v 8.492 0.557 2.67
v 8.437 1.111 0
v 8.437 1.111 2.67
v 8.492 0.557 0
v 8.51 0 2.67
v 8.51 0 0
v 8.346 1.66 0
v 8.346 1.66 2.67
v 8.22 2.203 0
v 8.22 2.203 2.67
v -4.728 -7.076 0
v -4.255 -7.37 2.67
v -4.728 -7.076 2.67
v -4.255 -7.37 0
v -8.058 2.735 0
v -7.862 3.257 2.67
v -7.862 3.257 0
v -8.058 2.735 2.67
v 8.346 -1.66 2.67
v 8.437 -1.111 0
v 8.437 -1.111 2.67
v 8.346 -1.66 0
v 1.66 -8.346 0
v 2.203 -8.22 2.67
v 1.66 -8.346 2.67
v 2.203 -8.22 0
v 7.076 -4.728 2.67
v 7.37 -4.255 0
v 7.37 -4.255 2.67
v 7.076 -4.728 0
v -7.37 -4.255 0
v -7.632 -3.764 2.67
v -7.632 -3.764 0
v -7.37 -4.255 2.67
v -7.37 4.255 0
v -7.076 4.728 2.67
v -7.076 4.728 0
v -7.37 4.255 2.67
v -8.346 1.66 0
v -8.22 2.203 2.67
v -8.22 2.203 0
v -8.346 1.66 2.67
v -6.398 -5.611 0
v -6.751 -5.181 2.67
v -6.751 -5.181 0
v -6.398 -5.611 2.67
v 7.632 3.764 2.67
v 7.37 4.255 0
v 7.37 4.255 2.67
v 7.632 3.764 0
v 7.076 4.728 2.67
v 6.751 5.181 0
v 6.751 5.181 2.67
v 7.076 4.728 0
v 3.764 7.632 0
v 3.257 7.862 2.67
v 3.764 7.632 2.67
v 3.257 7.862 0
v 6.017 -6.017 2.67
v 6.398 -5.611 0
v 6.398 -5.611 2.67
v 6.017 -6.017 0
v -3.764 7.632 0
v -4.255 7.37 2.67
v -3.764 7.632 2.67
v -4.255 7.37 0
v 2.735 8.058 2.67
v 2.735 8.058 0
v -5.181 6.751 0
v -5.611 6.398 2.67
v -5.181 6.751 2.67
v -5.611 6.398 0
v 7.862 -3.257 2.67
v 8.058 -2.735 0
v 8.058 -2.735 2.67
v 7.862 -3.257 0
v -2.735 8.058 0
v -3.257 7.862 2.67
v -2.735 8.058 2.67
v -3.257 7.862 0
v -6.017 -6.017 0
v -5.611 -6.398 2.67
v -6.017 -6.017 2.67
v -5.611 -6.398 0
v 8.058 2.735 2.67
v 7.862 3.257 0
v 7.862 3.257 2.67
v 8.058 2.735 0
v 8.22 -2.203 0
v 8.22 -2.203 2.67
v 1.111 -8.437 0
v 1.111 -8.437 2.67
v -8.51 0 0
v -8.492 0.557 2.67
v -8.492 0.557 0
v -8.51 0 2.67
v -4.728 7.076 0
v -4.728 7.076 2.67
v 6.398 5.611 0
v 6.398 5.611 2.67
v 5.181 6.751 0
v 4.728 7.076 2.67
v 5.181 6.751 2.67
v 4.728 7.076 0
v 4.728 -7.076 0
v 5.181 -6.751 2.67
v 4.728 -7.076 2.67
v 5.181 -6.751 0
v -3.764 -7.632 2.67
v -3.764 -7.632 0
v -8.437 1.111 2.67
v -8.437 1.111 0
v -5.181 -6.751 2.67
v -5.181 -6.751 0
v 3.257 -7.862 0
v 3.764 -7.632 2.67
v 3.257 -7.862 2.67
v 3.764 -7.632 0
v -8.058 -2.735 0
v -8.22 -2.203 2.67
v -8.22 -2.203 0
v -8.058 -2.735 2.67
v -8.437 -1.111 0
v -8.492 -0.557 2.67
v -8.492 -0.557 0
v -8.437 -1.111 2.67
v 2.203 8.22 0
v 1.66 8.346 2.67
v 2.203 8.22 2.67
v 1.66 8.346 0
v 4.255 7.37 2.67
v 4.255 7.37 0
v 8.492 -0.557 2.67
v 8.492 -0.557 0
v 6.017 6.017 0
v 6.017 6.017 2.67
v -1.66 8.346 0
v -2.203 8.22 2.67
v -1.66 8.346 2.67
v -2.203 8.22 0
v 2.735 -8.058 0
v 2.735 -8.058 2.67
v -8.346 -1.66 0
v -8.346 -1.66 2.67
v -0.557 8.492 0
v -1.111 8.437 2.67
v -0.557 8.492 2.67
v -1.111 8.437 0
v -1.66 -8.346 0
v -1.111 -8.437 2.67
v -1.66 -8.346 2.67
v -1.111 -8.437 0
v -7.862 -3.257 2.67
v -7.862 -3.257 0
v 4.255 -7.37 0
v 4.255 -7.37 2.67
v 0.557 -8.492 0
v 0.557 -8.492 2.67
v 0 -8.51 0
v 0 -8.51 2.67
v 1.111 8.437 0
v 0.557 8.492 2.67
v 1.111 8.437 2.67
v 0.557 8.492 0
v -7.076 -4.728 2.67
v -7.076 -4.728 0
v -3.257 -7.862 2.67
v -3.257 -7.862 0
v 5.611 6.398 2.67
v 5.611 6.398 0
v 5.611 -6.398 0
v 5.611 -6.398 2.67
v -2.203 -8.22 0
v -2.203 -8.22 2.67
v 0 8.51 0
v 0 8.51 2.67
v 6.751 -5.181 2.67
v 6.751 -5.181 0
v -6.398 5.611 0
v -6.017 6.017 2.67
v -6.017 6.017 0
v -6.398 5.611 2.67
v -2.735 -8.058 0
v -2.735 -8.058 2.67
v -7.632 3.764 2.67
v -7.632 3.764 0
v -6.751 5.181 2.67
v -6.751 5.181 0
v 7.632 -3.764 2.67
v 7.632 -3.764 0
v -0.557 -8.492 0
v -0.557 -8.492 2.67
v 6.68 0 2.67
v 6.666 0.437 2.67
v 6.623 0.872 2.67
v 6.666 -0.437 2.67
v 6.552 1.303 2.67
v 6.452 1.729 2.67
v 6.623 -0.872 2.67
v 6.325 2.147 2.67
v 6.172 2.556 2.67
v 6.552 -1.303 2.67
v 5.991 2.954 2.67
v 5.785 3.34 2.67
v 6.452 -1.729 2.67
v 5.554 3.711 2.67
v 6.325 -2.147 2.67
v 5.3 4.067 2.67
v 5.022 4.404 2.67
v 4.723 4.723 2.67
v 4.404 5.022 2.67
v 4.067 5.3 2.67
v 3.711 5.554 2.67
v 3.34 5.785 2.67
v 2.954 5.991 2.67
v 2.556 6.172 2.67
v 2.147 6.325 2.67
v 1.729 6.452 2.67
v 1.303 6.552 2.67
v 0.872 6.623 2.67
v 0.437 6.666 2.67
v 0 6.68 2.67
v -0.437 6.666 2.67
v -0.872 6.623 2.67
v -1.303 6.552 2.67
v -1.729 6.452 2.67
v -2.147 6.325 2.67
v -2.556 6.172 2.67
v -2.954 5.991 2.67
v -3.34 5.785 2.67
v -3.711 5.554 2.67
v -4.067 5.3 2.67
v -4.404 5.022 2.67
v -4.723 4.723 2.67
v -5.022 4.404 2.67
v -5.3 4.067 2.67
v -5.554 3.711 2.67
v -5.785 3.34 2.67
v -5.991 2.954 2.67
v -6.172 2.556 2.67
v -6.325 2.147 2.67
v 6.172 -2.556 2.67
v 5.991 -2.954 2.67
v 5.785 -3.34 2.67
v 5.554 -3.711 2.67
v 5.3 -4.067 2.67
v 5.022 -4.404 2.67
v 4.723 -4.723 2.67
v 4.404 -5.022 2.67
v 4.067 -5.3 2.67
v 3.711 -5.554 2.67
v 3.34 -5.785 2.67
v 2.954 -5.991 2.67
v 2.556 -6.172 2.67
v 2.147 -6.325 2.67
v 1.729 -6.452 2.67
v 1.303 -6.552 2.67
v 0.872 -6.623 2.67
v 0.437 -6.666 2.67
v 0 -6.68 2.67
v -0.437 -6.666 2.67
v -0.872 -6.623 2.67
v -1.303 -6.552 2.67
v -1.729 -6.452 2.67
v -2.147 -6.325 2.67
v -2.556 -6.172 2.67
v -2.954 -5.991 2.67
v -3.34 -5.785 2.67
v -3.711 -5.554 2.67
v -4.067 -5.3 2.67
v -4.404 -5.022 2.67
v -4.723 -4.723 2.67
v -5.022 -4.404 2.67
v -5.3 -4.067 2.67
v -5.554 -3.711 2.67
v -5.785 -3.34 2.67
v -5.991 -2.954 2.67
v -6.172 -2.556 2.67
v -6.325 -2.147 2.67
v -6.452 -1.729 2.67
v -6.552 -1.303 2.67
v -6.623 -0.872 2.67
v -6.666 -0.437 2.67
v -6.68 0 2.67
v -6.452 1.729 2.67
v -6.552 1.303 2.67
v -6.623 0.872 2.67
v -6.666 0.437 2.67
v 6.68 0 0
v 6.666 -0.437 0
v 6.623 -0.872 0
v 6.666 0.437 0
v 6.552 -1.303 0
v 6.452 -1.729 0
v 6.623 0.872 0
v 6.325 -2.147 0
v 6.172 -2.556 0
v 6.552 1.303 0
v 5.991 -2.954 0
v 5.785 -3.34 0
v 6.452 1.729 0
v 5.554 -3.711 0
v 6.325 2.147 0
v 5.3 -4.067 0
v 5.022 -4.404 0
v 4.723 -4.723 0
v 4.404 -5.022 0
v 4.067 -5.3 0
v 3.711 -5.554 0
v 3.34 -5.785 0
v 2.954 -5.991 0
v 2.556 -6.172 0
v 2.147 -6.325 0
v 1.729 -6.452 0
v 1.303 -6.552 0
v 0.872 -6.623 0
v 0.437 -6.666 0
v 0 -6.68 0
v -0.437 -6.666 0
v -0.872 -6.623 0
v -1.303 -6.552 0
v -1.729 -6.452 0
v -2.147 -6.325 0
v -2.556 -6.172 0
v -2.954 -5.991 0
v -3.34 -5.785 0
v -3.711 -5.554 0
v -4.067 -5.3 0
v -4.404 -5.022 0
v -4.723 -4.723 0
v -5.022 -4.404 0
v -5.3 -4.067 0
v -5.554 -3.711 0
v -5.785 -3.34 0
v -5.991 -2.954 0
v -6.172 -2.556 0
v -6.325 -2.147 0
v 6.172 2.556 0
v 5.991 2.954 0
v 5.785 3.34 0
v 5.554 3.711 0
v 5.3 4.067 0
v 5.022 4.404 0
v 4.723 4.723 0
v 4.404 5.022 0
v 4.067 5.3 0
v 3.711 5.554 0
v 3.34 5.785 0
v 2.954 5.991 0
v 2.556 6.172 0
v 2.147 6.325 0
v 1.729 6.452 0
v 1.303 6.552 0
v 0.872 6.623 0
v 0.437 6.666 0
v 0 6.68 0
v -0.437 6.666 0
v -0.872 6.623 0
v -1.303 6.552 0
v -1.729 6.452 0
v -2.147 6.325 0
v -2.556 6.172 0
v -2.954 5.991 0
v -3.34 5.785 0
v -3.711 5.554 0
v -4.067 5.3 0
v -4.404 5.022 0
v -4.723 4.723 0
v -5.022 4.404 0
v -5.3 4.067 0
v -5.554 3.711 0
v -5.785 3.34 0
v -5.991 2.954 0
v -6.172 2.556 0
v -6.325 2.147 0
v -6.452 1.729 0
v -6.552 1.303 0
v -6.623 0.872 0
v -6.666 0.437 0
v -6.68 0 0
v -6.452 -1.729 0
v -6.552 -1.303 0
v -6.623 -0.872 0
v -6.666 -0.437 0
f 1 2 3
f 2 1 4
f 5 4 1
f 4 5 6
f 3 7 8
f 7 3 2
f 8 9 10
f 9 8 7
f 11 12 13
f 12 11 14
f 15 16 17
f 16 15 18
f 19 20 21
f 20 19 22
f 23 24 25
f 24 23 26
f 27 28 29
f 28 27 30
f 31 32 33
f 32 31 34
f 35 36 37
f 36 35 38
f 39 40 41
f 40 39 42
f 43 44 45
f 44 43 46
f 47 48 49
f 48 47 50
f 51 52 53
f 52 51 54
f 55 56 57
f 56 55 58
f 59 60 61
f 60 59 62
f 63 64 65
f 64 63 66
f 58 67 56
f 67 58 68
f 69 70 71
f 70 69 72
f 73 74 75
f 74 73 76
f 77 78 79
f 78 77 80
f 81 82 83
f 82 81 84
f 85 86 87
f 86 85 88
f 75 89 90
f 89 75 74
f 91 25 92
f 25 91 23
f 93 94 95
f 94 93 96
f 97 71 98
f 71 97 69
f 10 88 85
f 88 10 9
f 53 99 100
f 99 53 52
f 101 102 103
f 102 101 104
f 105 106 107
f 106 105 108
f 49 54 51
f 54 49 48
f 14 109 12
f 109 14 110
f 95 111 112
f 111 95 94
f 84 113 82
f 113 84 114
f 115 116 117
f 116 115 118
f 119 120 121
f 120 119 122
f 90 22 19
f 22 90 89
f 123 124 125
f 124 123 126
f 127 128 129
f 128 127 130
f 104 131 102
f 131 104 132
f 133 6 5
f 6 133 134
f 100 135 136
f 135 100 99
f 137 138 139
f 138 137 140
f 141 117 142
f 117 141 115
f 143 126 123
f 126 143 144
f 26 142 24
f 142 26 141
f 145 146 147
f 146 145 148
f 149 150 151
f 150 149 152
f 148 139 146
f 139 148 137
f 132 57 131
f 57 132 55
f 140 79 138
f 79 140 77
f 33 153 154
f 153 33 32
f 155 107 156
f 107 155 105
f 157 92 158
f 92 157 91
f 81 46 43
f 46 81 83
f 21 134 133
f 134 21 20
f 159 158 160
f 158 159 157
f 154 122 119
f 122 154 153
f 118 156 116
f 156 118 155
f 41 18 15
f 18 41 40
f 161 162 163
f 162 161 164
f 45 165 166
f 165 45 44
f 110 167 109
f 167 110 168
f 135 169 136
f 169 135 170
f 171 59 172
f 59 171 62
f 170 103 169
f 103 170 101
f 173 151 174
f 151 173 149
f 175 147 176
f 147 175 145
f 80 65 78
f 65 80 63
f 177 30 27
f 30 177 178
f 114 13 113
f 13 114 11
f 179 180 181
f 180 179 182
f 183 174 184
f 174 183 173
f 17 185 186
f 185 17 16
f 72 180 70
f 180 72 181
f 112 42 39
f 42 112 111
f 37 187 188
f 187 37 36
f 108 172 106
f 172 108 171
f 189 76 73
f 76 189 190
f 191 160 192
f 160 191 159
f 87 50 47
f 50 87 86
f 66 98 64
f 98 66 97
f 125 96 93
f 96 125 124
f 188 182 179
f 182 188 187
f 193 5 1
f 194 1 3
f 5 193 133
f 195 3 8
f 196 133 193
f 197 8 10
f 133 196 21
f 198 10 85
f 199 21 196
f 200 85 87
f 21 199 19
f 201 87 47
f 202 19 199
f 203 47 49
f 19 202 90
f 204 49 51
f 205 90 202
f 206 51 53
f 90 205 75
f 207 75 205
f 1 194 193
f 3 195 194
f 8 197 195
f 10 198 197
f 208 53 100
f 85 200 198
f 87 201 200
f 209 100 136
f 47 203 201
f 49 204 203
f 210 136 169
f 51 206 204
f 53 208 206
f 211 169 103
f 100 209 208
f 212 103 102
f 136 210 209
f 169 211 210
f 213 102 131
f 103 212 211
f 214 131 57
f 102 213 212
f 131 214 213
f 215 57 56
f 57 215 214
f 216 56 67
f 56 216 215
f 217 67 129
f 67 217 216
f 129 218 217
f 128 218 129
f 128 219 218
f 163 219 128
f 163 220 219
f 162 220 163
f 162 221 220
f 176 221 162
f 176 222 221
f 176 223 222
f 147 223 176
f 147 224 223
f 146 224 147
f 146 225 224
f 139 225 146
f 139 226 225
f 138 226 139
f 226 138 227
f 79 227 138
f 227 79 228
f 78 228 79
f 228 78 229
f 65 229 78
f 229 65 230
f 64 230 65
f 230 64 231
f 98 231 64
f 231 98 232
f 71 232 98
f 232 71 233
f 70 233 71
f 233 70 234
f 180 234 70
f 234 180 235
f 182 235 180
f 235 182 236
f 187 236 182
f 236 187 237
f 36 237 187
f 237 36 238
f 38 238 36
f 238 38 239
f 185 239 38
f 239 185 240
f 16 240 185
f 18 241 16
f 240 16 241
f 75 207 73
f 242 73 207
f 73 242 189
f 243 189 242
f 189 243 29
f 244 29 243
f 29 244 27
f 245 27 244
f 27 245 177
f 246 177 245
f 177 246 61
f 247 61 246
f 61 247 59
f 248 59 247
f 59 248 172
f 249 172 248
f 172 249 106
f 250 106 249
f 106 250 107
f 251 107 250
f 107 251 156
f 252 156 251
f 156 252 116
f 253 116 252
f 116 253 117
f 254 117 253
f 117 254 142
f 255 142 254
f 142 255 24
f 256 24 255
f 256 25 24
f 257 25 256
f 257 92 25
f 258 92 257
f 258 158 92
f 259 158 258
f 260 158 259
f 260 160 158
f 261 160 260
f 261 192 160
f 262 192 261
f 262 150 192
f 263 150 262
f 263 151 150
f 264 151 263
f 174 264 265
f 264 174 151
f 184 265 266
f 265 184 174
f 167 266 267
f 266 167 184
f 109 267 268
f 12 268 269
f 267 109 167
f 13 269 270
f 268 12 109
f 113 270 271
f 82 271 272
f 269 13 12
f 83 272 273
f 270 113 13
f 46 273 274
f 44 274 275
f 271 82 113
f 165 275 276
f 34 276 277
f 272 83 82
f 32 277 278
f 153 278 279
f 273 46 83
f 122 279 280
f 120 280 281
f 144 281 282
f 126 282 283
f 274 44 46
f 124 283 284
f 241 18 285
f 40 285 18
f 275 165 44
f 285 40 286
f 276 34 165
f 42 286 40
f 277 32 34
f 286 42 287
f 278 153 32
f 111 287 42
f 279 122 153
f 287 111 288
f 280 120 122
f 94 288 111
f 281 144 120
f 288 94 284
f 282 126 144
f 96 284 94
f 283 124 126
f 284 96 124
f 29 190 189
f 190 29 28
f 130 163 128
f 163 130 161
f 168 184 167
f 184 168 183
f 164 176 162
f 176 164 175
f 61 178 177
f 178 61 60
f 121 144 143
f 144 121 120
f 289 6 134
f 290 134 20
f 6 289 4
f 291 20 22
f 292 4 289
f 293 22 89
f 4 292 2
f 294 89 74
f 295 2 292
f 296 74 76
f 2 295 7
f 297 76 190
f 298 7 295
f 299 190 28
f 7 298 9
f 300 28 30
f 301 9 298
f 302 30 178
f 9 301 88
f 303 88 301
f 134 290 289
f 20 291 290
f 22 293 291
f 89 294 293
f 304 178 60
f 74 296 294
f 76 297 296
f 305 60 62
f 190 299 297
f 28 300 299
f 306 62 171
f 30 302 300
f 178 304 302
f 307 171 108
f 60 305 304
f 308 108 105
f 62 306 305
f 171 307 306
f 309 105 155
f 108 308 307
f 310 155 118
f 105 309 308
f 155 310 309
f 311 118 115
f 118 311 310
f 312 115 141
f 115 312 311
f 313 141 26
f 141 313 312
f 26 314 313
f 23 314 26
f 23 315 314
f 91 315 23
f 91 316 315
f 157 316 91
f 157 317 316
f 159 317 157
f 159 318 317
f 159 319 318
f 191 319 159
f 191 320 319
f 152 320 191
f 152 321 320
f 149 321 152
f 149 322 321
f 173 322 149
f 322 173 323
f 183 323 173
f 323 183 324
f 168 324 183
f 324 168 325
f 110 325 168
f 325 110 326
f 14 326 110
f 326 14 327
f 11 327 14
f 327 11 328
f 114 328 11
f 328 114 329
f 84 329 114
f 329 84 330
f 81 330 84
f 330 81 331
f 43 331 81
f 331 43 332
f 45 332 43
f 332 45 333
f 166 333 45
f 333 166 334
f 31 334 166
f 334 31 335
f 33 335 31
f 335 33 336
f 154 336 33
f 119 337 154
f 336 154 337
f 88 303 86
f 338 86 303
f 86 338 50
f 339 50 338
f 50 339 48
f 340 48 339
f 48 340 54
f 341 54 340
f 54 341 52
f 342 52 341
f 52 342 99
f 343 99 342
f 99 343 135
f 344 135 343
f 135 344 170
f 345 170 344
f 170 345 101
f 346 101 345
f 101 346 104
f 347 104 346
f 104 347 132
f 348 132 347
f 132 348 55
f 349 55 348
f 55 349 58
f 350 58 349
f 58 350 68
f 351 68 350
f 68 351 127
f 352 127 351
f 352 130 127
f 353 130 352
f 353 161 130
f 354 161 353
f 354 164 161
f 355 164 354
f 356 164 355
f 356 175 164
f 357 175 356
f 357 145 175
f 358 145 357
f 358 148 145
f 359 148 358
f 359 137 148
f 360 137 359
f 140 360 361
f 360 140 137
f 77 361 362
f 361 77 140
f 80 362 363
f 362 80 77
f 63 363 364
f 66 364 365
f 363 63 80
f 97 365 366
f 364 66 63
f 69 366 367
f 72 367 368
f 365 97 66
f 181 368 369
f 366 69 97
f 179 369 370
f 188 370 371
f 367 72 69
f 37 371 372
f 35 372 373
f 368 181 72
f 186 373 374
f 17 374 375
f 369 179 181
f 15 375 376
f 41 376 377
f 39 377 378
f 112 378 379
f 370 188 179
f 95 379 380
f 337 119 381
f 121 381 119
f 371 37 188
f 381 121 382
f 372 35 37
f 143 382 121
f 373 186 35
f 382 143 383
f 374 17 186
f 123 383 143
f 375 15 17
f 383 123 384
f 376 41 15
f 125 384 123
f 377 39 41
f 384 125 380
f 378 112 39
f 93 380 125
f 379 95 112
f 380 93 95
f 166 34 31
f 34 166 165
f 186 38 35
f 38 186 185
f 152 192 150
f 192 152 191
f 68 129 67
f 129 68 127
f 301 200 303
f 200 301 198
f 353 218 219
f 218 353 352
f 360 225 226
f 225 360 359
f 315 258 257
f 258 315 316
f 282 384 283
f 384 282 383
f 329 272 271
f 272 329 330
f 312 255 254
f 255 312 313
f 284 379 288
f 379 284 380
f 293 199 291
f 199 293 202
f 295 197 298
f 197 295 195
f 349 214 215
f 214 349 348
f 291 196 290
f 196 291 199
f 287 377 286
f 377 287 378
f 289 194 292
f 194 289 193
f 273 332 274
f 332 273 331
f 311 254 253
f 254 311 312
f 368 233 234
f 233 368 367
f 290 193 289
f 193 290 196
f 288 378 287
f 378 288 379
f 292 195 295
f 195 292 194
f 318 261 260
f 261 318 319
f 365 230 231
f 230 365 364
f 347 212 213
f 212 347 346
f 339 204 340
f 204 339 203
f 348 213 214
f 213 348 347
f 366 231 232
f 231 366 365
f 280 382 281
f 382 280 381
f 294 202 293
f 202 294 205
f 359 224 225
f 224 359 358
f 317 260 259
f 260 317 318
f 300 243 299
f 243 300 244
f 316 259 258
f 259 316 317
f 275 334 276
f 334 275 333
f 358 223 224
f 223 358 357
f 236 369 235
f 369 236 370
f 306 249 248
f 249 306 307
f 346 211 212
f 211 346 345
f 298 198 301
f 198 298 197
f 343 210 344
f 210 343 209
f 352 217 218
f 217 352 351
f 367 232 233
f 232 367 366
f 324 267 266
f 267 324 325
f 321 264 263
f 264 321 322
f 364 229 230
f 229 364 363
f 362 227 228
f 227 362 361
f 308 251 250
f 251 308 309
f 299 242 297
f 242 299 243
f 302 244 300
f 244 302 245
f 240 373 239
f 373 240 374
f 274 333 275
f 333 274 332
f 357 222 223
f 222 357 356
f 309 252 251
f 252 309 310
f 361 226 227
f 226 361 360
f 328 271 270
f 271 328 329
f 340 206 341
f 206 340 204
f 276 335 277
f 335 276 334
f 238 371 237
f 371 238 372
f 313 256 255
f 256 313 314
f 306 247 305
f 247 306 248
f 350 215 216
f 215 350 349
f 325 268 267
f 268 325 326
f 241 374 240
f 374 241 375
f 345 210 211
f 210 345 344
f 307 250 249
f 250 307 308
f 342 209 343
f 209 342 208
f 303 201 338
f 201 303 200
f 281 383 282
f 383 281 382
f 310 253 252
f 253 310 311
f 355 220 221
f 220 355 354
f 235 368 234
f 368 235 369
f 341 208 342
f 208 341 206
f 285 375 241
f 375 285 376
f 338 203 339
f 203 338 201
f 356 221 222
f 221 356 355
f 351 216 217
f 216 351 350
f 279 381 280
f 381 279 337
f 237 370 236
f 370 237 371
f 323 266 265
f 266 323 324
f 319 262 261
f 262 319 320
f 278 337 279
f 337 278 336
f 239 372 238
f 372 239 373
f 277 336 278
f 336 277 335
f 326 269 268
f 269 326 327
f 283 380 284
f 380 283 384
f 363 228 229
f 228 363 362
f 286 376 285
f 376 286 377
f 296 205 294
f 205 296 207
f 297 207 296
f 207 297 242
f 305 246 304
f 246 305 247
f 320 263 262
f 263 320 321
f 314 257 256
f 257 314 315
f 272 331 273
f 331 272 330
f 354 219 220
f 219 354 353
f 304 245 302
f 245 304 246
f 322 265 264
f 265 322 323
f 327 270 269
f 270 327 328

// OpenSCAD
// A split ring of the parts library (packages/contracts/src/parts/split-rings.ts), at the sizes given as -D overrides: two flat
// turns of the band, one on the other, from the inside diameter D_IN to the outside diameter D_OUT, THICKNESS over both turns.
// `npm run check:assembly` renders it to check the rings a model hangs on (e.g. the cat collar tag's). Frame: millimetres, as the
// parts library's preview: lying on z = 0, centred on the Z axis. Drawn as one closed ring (the split and the turns' gap left out).

D_OUT = 17.02;
D_IN = 13.36;
THICKNESS = 2.67;

$fn = 96;
difference() {
  cylinder(d = D_OUT, h = THICKNESS);
  translate([0, 0, -1]) cylinder(d = D_IN, h = THICKNESS + 2);
}
